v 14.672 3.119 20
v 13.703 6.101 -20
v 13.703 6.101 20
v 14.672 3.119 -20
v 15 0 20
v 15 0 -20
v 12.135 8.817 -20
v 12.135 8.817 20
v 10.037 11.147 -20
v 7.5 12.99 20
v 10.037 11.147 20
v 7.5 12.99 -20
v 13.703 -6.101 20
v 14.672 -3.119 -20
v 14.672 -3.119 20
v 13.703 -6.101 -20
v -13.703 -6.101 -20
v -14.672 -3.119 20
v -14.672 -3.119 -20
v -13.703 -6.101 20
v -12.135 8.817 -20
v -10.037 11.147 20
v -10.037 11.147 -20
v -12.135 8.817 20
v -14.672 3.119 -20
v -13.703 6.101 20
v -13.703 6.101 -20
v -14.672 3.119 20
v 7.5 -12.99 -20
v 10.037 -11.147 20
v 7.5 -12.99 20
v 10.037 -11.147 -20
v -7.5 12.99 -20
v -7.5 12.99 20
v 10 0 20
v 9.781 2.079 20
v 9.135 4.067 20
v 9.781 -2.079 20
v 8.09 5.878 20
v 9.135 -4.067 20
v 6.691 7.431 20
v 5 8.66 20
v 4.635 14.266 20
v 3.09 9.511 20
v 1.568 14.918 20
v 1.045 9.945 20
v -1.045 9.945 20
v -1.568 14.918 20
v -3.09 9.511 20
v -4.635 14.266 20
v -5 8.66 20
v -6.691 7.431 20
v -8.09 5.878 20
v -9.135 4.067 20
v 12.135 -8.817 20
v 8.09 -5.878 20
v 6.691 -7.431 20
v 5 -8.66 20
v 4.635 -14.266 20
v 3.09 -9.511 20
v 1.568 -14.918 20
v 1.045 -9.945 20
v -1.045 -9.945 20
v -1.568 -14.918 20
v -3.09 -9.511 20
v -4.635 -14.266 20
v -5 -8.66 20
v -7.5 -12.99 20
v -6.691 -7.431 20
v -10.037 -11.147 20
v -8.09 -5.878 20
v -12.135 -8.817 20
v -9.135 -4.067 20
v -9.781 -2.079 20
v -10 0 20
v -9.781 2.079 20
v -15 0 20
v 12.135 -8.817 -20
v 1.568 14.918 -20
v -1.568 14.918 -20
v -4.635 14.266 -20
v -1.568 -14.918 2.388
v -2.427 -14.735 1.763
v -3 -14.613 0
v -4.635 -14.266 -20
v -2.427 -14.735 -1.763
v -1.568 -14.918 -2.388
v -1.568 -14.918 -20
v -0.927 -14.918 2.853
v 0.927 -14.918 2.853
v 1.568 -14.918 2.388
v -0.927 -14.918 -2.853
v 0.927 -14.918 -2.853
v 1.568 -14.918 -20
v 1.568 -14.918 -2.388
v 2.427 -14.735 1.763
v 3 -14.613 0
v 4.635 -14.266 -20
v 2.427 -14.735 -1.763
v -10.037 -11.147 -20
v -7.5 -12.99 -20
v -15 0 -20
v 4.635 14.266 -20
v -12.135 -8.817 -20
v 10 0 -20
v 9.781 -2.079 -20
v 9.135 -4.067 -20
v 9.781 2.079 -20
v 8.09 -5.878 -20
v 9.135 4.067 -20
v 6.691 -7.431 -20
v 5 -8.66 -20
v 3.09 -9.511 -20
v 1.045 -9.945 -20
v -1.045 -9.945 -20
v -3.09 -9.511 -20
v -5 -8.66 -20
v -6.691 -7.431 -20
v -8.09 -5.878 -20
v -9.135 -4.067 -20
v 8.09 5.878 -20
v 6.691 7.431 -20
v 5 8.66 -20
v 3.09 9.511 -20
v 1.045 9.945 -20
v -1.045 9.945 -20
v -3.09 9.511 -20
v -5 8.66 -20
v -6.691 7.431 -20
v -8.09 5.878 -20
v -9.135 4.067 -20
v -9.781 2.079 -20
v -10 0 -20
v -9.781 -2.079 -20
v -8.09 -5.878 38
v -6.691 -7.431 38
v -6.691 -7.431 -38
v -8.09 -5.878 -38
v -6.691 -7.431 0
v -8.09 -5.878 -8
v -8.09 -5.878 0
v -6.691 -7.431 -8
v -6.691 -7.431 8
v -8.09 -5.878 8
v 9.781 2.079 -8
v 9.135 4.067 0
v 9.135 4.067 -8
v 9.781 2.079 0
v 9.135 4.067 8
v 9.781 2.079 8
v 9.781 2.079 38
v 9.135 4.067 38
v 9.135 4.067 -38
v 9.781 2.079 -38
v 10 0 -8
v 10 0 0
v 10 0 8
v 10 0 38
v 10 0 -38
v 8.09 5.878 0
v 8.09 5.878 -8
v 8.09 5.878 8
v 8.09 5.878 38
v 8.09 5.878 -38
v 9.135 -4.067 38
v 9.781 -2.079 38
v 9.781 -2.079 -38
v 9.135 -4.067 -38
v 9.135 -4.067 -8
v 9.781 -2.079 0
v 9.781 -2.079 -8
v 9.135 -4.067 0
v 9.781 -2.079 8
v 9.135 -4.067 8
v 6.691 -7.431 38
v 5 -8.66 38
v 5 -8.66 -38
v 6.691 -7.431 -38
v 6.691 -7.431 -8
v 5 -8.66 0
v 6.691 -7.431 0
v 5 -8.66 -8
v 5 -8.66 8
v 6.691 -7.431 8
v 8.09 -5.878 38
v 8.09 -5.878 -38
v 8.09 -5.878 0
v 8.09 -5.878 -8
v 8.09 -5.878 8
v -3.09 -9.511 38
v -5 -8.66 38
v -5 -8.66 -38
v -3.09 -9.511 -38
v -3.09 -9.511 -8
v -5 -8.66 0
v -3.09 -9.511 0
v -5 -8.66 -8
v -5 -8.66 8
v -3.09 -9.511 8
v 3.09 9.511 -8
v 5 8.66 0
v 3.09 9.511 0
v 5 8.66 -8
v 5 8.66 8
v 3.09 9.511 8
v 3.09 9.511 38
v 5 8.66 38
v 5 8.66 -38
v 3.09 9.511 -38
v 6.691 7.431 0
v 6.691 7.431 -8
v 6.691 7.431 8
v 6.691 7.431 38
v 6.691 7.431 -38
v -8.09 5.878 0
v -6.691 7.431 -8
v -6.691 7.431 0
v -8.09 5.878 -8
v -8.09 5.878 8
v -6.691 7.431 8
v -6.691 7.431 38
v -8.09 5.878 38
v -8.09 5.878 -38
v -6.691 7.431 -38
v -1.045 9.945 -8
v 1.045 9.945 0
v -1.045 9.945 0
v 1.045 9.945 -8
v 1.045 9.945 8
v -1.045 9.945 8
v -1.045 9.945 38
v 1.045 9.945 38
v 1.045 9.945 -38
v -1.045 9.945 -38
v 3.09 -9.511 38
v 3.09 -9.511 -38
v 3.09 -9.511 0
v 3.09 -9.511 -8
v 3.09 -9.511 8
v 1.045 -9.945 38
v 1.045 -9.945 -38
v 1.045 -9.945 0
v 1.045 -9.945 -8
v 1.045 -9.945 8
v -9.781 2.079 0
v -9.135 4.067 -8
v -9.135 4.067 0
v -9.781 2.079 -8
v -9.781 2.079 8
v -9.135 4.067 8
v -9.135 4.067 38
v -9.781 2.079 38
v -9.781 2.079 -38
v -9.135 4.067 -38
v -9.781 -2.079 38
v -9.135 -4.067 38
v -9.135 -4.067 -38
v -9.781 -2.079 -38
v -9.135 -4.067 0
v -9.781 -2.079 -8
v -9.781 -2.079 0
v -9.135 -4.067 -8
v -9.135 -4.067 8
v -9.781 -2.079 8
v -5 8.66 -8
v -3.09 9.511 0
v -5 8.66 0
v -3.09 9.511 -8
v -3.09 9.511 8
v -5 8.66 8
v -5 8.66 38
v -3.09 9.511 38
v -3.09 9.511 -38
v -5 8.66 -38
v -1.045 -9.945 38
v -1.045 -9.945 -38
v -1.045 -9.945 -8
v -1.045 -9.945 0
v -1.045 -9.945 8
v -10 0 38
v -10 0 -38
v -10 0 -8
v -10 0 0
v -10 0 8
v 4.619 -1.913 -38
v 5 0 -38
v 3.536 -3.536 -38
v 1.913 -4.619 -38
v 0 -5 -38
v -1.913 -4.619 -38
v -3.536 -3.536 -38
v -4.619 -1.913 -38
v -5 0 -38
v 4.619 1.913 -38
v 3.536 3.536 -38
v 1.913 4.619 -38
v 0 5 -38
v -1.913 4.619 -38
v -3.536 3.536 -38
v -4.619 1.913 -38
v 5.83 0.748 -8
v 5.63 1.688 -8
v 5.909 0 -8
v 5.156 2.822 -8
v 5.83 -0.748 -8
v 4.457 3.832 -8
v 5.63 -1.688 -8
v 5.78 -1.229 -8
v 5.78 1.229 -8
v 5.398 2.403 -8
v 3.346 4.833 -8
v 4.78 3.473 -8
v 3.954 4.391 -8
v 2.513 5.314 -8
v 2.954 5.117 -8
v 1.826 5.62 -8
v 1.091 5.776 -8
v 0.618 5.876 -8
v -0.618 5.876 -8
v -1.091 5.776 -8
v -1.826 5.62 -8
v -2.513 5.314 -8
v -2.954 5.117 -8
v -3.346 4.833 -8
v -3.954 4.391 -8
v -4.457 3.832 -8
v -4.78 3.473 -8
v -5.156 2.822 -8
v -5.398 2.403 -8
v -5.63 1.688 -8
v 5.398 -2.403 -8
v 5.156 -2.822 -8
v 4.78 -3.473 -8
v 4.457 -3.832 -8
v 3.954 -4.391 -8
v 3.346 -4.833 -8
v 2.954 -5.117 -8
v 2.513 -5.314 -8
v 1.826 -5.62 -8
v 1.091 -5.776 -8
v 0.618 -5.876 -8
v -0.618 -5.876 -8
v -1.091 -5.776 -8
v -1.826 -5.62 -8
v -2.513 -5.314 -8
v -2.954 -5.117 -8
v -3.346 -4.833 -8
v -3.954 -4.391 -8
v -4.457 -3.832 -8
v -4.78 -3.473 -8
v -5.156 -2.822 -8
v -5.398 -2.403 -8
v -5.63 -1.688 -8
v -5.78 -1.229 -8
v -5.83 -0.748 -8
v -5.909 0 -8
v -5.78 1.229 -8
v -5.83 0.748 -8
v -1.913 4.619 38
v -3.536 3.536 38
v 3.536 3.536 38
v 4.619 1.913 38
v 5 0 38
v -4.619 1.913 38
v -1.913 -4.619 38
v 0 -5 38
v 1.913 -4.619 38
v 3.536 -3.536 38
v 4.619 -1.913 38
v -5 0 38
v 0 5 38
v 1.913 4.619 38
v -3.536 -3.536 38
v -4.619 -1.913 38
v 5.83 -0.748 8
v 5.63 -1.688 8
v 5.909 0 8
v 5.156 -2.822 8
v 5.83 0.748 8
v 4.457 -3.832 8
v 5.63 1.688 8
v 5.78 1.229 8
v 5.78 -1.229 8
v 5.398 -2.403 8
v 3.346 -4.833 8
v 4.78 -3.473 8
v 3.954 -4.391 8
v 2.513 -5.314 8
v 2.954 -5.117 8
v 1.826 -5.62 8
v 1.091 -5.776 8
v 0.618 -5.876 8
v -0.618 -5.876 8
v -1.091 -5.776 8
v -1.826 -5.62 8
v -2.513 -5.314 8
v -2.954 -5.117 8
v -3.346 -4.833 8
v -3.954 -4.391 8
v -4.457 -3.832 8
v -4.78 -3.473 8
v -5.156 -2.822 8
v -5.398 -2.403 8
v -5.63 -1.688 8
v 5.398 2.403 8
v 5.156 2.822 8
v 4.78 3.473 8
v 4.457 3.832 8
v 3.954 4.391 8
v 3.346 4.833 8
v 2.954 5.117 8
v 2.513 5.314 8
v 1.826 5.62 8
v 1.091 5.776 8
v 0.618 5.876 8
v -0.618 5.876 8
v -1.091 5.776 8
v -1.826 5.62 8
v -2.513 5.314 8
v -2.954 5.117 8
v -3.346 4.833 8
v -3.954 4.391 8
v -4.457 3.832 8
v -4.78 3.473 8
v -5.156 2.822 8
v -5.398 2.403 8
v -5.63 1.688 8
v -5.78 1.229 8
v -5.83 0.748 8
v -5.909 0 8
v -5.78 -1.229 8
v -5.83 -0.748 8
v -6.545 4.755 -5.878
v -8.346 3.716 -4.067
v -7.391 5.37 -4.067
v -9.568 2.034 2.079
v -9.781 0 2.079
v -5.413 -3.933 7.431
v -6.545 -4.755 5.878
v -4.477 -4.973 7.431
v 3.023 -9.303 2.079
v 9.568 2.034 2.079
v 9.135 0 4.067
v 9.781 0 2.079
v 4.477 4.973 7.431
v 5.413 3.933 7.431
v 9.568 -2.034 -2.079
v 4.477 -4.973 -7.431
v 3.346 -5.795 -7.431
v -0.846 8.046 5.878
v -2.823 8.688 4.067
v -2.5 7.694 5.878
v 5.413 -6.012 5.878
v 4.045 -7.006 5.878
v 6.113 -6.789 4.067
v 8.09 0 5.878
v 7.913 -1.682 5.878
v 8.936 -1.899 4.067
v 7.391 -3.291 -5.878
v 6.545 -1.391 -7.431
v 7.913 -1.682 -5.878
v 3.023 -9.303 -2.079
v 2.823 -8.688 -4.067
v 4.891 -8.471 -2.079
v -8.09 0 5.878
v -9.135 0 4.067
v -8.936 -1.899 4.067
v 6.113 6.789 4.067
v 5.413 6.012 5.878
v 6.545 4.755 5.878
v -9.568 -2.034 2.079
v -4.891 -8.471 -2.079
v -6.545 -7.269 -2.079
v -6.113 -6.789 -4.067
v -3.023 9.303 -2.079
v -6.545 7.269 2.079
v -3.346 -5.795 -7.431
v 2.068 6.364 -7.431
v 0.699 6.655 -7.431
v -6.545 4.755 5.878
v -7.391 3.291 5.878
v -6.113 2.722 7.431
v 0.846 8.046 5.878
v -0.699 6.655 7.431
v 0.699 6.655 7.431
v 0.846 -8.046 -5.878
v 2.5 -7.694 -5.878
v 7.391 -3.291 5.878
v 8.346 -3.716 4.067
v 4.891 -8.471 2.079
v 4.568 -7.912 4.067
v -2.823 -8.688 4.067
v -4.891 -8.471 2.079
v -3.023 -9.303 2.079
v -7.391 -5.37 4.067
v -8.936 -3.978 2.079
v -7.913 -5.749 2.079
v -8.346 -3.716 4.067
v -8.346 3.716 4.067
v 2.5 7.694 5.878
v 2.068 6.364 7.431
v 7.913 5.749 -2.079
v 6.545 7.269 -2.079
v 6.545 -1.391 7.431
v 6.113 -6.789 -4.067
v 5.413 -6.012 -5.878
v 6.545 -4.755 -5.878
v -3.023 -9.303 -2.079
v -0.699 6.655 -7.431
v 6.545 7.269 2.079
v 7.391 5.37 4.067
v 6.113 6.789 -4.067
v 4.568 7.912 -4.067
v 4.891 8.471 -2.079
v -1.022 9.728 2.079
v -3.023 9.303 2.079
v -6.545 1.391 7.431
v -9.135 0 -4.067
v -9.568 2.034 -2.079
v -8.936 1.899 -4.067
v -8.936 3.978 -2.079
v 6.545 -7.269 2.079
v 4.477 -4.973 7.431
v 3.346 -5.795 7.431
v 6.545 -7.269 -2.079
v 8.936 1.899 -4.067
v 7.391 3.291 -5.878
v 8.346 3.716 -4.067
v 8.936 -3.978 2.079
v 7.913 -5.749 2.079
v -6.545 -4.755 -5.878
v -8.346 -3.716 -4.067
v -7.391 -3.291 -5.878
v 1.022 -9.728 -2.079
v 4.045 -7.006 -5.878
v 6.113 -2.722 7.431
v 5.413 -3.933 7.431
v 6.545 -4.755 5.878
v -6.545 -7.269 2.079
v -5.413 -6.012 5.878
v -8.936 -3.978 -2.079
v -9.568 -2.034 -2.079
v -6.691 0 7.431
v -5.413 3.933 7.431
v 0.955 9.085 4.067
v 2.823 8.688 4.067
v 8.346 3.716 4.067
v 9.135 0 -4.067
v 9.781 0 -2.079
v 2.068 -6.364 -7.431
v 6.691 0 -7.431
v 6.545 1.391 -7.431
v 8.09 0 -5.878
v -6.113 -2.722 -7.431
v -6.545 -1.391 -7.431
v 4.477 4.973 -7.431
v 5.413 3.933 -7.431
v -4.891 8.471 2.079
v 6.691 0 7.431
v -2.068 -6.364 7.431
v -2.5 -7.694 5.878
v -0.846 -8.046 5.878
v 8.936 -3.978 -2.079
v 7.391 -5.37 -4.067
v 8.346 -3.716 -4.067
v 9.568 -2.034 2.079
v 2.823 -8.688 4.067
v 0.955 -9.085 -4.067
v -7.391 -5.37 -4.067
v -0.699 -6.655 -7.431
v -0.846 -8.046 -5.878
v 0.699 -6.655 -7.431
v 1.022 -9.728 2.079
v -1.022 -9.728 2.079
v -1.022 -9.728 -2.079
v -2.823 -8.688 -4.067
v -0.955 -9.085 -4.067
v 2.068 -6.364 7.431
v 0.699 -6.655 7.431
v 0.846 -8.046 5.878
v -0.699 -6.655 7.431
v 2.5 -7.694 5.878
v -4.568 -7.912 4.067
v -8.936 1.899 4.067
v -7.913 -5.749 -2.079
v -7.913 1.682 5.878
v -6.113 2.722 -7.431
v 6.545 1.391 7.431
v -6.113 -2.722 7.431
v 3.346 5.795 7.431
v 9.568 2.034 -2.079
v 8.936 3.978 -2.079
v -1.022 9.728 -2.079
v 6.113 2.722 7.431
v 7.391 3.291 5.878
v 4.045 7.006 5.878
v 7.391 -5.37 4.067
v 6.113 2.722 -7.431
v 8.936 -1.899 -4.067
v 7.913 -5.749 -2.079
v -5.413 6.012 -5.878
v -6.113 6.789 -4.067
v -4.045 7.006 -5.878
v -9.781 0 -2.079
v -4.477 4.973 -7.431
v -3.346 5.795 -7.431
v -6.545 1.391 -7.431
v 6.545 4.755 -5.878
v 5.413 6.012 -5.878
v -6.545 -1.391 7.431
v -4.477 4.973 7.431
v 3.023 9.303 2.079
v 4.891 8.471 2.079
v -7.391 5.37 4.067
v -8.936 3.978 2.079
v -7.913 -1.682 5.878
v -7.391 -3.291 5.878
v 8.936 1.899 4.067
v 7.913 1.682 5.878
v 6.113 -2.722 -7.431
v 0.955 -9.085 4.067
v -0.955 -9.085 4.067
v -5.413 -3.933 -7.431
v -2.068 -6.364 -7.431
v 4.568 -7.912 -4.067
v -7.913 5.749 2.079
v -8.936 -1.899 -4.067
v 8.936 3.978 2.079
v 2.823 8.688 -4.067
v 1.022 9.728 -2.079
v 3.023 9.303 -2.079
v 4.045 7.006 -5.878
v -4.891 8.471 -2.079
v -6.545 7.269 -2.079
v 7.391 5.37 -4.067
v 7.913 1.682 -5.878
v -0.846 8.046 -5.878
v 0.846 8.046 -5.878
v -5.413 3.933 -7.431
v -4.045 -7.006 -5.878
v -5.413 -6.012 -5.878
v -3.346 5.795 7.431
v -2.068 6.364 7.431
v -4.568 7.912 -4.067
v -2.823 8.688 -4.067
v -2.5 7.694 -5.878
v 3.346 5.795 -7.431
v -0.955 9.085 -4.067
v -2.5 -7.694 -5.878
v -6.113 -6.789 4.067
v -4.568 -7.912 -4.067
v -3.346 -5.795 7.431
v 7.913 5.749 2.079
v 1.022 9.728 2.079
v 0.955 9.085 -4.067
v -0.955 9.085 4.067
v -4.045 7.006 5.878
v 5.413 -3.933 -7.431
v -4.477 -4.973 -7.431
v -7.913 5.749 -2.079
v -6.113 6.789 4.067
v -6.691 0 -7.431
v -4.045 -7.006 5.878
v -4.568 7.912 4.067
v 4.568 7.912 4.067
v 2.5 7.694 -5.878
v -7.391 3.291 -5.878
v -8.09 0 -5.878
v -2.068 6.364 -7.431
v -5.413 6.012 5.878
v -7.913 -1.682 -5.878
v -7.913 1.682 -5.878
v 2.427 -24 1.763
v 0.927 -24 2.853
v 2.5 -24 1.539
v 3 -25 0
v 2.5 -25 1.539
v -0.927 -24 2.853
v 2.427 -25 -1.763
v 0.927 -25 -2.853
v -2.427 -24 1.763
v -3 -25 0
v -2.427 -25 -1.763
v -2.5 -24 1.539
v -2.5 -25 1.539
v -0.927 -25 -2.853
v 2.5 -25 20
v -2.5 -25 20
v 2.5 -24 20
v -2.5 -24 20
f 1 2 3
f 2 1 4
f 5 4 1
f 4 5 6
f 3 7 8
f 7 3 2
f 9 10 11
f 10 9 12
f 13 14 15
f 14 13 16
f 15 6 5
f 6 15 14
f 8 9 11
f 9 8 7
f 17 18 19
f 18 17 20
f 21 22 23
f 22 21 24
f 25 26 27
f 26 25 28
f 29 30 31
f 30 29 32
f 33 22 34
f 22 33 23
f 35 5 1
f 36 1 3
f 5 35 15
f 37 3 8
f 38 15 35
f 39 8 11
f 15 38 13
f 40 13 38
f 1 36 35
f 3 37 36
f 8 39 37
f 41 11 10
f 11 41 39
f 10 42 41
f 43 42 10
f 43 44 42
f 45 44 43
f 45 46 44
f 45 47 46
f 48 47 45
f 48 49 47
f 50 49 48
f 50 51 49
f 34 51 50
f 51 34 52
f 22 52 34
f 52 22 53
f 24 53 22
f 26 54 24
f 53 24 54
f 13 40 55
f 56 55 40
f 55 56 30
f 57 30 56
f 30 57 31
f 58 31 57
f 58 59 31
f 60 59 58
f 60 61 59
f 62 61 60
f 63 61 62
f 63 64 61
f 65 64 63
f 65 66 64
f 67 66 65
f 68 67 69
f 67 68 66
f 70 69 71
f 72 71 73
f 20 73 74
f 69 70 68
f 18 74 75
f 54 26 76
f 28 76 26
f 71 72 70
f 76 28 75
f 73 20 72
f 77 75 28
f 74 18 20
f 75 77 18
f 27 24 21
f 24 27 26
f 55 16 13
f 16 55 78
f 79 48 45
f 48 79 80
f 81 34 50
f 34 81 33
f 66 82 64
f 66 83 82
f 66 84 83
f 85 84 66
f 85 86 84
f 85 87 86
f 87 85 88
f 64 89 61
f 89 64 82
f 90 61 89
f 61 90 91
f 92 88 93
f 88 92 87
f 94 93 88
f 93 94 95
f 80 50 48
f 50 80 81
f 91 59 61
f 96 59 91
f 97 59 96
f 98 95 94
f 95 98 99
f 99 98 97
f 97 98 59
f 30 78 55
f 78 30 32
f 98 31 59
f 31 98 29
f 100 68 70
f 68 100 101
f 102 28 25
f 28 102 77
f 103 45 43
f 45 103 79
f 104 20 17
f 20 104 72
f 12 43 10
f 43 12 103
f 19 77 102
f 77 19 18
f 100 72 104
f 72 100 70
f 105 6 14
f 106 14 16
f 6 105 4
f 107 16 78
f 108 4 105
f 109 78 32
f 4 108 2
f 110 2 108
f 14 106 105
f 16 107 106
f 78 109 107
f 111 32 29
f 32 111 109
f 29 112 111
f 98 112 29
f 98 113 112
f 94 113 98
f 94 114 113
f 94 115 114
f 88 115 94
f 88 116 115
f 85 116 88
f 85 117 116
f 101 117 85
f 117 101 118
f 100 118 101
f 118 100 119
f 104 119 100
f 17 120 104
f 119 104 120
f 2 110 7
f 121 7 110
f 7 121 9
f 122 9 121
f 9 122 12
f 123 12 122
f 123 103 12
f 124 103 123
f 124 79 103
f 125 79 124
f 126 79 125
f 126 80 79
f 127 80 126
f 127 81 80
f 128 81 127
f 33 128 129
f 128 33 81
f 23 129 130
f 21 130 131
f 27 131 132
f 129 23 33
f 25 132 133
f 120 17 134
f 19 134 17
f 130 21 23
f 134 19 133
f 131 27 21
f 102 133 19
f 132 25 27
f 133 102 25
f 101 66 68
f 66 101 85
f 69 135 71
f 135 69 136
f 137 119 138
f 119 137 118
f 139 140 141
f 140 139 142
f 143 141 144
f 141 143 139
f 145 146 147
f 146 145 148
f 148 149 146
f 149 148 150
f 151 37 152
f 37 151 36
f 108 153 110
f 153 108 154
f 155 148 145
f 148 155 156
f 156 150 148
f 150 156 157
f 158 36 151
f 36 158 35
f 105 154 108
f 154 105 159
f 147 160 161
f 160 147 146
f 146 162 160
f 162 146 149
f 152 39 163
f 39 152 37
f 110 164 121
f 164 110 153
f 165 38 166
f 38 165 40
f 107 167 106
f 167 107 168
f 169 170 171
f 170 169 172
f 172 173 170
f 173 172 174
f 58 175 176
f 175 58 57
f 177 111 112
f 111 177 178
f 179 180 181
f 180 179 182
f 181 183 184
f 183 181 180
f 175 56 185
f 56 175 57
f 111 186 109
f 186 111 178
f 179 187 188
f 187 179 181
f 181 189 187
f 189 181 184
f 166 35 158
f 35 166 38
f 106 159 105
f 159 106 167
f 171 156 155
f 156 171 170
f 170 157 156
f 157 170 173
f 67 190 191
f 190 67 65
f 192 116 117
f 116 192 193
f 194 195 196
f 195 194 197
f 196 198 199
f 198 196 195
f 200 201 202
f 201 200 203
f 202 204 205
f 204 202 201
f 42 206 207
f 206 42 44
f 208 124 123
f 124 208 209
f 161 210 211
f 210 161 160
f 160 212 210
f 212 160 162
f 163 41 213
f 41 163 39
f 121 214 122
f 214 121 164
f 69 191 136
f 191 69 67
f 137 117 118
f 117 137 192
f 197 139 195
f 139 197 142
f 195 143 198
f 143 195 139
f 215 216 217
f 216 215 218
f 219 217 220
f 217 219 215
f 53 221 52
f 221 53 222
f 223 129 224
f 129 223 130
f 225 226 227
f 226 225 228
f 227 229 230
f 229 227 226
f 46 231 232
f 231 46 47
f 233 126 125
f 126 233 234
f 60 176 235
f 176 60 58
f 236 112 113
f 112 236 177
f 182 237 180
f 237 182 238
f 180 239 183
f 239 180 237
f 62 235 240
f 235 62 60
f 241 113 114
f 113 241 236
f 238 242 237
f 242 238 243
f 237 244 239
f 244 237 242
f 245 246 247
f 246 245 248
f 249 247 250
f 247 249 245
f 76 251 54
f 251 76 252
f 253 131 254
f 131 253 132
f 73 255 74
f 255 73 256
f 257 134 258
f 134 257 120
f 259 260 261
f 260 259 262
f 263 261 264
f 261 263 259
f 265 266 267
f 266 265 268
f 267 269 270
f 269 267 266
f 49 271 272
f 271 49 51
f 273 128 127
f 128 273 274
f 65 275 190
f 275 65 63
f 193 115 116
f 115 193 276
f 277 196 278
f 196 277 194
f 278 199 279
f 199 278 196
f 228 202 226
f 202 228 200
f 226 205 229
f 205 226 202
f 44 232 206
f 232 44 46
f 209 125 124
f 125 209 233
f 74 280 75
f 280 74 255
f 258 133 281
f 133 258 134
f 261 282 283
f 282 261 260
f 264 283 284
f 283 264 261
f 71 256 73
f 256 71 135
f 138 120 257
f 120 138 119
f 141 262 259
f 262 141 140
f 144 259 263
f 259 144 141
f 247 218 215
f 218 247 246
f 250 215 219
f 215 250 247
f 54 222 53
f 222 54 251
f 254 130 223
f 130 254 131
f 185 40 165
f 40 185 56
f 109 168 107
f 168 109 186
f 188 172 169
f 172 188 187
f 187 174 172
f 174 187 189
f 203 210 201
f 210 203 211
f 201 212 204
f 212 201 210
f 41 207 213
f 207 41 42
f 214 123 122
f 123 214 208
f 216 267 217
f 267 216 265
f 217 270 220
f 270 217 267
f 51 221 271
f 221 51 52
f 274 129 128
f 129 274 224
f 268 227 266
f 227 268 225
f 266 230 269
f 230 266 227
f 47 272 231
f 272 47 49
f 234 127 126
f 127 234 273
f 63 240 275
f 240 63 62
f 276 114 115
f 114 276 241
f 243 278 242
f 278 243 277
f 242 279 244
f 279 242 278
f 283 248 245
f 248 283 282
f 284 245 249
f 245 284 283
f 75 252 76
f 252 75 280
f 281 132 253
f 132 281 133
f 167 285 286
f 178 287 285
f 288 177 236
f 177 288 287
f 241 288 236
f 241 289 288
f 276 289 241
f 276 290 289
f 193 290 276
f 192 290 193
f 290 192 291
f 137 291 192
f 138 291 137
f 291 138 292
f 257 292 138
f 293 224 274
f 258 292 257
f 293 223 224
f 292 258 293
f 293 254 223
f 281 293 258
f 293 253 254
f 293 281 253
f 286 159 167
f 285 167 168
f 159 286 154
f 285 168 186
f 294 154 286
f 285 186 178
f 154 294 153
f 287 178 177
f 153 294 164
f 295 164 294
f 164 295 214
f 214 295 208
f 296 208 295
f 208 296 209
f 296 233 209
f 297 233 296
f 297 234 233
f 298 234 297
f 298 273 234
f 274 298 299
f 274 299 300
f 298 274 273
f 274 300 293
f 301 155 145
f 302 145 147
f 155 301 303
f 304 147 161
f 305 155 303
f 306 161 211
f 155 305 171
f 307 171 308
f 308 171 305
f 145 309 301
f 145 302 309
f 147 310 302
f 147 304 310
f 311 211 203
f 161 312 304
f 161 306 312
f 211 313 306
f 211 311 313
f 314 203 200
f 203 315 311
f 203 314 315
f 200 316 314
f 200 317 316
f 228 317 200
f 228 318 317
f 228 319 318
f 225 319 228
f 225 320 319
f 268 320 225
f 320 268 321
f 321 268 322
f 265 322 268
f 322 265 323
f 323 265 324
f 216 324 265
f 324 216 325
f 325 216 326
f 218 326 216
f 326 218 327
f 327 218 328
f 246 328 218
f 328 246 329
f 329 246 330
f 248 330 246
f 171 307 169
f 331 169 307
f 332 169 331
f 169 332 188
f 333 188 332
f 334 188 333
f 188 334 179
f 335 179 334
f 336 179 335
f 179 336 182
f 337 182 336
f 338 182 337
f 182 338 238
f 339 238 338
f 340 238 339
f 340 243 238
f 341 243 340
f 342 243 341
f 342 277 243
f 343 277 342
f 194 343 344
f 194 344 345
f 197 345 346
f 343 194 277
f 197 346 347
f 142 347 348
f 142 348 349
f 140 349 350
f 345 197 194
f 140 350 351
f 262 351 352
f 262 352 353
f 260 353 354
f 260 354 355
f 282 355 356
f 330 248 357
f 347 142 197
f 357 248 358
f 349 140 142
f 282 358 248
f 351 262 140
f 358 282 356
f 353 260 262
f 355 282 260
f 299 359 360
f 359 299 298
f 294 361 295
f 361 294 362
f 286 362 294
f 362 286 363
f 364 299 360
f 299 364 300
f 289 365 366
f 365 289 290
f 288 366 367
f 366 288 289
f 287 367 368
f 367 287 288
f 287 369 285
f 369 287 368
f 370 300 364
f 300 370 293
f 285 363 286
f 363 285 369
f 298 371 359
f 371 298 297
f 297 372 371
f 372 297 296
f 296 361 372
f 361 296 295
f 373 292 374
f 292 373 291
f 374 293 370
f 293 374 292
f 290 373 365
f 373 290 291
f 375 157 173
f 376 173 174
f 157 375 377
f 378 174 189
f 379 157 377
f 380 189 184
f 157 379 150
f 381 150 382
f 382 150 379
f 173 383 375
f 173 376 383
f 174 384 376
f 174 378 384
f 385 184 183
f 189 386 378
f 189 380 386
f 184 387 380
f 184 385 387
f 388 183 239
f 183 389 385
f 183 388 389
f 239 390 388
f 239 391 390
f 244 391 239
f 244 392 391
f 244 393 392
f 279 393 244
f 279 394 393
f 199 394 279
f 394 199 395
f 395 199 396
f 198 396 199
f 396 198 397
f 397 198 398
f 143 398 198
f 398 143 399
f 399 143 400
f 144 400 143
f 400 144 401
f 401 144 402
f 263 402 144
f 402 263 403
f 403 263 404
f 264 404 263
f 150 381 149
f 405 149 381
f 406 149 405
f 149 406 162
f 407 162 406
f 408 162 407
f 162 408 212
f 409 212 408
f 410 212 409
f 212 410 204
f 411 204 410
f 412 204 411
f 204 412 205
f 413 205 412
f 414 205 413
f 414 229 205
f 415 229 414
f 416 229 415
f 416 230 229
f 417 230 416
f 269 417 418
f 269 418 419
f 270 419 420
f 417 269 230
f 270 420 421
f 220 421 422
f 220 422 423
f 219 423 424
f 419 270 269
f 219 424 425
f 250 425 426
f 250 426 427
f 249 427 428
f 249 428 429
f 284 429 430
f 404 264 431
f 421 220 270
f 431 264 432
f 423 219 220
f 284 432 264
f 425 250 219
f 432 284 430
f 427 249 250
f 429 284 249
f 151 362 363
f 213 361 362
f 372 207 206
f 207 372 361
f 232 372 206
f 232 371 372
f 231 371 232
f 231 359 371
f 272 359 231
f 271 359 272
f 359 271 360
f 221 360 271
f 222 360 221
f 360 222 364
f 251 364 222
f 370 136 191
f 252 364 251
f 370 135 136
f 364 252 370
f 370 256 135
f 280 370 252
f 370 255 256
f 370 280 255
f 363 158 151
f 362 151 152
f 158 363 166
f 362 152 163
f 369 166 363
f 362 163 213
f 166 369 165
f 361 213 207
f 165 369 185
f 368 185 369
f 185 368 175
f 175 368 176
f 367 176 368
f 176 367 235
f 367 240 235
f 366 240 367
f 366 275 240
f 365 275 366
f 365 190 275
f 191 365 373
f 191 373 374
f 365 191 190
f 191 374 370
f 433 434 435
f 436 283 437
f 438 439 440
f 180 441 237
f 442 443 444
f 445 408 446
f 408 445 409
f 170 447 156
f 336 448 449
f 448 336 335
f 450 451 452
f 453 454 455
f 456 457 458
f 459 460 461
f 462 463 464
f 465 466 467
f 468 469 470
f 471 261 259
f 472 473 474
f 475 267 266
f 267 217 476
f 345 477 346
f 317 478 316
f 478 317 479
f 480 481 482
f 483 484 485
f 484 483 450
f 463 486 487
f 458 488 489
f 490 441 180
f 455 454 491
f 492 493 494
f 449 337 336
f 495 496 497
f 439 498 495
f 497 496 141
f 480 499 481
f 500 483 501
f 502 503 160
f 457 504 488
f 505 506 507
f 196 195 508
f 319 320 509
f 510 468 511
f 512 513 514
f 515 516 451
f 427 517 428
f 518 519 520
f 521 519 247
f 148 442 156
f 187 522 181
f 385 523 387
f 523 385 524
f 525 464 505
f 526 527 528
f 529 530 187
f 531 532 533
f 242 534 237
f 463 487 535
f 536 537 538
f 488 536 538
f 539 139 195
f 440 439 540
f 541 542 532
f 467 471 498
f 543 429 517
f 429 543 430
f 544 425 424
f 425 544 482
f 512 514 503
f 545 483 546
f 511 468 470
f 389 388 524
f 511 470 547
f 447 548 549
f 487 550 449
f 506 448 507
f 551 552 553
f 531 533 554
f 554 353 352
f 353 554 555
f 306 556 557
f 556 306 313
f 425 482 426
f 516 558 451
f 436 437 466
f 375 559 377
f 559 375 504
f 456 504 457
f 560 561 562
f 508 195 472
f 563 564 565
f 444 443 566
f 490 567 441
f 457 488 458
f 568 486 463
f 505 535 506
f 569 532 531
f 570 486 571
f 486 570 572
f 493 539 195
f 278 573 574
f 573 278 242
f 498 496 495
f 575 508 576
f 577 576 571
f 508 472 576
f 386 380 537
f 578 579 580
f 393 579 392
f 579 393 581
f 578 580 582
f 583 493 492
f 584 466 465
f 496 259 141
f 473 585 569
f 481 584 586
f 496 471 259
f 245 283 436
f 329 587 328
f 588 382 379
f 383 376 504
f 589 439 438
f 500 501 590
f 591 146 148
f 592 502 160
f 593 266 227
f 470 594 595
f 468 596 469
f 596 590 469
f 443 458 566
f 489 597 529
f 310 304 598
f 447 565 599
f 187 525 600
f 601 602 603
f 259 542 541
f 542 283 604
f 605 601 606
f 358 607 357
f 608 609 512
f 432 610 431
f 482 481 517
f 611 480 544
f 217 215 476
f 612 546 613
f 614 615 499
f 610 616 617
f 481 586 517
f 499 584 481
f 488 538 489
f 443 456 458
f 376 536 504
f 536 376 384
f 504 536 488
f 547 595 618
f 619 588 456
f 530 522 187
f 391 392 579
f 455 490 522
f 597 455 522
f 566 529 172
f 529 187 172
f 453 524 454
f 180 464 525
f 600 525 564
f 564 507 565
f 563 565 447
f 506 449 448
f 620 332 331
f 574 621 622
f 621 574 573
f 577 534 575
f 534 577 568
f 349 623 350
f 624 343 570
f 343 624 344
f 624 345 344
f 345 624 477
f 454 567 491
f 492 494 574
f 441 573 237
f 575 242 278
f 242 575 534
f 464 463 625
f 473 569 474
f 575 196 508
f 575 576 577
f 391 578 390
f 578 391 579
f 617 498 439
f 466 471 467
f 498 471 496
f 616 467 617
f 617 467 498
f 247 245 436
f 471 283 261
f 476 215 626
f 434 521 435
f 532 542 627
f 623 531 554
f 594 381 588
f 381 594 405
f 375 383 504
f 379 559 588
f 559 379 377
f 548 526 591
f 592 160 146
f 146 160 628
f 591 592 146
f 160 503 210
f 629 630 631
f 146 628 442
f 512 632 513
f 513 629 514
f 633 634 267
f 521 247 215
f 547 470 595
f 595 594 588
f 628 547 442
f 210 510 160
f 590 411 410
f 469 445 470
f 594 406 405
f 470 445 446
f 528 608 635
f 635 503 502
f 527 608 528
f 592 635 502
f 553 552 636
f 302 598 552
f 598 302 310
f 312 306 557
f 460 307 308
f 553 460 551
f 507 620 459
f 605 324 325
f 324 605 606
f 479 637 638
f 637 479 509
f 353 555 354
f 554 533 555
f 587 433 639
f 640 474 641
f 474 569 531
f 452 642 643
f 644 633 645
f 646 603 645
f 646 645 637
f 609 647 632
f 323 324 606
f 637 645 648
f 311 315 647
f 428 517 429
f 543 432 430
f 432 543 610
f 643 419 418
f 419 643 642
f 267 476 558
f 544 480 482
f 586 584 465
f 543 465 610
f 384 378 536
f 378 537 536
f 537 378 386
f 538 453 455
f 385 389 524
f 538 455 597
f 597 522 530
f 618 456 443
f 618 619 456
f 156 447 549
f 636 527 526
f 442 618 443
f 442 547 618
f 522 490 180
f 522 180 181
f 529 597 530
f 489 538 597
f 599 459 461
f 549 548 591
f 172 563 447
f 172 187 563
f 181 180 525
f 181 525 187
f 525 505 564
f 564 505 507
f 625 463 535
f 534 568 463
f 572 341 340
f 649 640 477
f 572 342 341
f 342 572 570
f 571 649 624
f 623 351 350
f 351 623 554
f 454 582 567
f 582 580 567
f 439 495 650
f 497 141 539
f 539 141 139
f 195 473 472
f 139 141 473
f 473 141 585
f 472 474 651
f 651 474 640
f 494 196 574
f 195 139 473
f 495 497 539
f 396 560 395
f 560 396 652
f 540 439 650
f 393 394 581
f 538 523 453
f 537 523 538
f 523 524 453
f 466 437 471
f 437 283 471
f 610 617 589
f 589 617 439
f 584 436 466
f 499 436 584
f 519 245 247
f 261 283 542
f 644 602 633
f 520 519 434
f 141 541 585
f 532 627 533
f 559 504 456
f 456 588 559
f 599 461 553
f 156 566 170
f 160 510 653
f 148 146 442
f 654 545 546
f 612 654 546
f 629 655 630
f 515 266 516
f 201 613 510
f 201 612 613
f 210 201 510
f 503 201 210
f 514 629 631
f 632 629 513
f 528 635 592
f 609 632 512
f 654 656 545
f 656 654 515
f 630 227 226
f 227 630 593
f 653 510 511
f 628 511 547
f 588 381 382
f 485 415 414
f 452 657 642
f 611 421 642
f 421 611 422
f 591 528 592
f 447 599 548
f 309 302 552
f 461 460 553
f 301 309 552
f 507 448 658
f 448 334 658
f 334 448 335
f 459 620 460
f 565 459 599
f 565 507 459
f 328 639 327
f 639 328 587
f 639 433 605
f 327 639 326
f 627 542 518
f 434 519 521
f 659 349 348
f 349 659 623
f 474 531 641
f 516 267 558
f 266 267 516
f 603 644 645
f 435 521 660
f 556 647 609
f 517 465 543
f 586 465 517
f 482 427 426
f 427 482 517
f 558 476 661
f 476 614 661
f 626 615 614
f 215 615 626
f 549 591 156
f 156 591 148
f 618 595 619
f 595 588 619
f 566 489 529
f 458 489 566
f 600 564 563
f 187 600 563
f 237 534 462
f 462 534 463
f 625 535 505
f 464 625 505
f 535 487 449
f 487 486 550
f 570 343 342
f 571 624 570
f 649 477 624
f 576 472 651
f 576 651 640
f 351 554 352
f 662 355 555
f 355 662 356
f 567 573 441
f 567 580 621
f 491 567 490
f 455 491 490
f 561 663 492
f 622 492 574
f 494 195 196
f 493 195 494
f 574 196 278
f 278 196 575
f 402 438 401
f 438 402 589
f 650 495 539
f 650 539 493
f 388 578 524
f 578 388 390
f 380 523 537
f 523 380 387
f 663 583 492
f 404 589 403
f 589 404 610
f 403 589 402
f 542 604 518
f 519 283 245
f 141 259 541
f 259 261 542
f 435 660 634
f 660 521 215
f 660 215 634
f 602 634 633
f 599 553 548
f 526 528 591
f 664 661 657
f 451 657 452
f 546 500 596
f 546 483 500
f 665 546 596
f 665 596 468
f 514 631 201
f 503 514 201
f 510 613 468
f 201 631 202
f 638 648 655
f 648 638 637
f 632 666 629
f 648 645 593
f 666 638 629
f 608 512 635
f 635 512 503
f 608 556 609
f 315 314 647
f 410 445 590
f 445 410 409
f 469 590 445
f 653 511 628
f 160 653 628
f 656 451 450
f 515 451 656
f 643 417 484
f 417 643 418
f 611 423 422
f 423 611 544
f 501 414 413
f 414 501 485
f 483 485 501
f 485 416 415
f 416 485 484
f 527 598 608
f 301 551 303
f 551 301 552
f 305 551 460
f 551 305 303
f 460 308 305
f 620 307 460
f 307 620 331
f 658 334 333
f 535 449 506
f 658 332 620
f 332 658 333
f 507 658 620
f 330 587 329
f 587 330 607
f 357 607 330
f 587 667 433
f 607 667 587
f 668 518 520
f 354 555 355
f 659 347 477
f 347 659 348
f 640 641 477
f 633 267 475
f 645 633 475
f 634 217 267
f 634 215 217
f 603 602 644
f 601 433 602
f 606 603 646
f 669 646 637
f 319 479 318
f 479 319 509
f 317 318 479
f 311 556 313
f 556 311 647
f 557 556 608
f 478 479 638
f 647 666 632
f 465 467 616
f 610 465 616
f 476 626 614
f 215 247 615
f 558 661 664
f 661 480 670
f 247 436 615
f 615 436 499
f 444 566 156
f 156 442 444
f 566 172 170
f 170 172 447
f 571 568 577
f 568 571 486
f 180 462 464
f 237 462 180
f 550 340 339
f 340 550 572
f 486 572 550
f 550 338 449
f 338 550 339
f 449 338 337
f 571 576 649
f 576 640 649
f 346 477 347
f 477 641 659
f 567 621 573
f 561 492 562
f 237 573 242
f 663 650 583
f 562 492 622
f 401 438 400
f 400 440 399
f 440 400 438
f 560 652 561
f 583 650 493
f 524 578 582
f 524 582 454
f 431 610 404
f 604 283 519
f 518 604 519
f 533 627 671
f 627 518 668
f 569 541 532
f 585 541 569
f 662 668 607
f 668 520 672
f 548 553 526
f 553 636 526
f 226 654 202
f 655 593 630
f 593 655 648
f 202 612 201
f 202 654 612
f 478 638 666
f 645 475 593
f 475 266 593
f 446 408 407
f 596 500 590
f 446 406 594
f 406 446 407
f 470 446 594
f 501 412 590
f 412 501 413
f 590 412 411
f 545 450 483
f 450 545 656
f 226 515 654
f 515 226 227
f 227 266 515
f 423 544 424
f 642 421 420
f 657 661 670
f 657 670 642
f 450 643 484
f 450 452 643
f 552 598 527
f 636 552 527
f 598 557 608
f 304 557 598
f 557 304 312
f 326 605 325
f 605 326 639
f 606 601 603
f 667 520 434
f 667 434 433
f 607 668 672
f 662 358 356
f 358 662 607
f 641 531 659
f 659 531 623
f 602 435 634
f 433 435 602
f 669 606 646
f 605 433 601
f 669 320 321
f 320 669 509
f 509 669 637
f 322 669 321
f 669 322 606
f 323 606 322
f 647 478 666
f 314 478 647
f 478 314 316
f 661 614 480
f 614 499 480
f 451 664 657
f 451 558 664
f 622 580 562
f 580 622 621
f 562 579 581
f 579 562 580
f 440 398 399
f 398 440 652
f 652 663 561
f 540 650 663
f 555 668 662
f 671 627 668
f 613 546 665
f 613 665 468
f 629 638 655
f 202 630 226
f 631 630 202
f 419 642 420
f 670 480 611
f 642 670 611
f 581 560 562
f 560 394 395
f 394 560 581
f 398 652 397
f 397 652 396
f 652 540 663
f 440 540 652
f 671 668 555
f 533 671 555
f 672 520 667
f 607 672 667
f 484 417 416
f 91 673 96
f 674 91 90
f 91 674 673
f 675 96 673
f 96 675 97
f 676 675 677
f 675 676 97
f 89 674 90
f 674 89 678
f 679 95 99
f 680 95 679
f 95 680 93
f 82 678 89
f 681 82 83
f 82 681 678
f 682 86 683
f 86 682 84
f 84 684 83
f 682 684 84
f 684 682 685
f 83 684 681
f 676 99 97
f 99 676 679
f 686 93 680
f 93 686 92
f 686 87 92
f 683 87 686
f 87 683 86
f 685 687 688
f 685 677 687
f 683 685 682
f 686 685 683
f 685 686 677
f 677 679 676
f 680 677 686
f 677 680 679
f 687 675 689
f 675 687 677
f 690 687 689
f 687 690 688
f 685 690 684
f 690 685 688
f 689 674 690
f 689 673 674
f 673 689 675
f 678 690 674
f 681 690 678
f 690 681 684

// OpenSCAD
module ball() {
    union() {
        union() {
            difference() {
                color("red") sphere(10);
                translate([0,0,-10]) cylinder(20,5,5);
            }
            translate([0,-10,0]) rotate([90,0,0]) cylinder(15,3,3);
        }
        translate([-2.5,-25,0]) cube([5,1,20]);
    }
}

module innerPipe() {
    difference() {
        color("yellow") cylinder(30, 10, 10);
        translate([0,0,-5]) cylinder(40, 5, 5);
    }
}
module pipe() {
    union() {
        difference() {
            color("yellow") cylinder(40, 15, 15);
            translate([0,0,-5]) cylinder(50, 10, 10);
        }
        translate ([0,0, -18]) innerPipe();
        translate([0,0,28]) innerPipe();
    }
}

translate([0,0,-20]) pipe();
rotate([0,90 * $t,0]) ball();
